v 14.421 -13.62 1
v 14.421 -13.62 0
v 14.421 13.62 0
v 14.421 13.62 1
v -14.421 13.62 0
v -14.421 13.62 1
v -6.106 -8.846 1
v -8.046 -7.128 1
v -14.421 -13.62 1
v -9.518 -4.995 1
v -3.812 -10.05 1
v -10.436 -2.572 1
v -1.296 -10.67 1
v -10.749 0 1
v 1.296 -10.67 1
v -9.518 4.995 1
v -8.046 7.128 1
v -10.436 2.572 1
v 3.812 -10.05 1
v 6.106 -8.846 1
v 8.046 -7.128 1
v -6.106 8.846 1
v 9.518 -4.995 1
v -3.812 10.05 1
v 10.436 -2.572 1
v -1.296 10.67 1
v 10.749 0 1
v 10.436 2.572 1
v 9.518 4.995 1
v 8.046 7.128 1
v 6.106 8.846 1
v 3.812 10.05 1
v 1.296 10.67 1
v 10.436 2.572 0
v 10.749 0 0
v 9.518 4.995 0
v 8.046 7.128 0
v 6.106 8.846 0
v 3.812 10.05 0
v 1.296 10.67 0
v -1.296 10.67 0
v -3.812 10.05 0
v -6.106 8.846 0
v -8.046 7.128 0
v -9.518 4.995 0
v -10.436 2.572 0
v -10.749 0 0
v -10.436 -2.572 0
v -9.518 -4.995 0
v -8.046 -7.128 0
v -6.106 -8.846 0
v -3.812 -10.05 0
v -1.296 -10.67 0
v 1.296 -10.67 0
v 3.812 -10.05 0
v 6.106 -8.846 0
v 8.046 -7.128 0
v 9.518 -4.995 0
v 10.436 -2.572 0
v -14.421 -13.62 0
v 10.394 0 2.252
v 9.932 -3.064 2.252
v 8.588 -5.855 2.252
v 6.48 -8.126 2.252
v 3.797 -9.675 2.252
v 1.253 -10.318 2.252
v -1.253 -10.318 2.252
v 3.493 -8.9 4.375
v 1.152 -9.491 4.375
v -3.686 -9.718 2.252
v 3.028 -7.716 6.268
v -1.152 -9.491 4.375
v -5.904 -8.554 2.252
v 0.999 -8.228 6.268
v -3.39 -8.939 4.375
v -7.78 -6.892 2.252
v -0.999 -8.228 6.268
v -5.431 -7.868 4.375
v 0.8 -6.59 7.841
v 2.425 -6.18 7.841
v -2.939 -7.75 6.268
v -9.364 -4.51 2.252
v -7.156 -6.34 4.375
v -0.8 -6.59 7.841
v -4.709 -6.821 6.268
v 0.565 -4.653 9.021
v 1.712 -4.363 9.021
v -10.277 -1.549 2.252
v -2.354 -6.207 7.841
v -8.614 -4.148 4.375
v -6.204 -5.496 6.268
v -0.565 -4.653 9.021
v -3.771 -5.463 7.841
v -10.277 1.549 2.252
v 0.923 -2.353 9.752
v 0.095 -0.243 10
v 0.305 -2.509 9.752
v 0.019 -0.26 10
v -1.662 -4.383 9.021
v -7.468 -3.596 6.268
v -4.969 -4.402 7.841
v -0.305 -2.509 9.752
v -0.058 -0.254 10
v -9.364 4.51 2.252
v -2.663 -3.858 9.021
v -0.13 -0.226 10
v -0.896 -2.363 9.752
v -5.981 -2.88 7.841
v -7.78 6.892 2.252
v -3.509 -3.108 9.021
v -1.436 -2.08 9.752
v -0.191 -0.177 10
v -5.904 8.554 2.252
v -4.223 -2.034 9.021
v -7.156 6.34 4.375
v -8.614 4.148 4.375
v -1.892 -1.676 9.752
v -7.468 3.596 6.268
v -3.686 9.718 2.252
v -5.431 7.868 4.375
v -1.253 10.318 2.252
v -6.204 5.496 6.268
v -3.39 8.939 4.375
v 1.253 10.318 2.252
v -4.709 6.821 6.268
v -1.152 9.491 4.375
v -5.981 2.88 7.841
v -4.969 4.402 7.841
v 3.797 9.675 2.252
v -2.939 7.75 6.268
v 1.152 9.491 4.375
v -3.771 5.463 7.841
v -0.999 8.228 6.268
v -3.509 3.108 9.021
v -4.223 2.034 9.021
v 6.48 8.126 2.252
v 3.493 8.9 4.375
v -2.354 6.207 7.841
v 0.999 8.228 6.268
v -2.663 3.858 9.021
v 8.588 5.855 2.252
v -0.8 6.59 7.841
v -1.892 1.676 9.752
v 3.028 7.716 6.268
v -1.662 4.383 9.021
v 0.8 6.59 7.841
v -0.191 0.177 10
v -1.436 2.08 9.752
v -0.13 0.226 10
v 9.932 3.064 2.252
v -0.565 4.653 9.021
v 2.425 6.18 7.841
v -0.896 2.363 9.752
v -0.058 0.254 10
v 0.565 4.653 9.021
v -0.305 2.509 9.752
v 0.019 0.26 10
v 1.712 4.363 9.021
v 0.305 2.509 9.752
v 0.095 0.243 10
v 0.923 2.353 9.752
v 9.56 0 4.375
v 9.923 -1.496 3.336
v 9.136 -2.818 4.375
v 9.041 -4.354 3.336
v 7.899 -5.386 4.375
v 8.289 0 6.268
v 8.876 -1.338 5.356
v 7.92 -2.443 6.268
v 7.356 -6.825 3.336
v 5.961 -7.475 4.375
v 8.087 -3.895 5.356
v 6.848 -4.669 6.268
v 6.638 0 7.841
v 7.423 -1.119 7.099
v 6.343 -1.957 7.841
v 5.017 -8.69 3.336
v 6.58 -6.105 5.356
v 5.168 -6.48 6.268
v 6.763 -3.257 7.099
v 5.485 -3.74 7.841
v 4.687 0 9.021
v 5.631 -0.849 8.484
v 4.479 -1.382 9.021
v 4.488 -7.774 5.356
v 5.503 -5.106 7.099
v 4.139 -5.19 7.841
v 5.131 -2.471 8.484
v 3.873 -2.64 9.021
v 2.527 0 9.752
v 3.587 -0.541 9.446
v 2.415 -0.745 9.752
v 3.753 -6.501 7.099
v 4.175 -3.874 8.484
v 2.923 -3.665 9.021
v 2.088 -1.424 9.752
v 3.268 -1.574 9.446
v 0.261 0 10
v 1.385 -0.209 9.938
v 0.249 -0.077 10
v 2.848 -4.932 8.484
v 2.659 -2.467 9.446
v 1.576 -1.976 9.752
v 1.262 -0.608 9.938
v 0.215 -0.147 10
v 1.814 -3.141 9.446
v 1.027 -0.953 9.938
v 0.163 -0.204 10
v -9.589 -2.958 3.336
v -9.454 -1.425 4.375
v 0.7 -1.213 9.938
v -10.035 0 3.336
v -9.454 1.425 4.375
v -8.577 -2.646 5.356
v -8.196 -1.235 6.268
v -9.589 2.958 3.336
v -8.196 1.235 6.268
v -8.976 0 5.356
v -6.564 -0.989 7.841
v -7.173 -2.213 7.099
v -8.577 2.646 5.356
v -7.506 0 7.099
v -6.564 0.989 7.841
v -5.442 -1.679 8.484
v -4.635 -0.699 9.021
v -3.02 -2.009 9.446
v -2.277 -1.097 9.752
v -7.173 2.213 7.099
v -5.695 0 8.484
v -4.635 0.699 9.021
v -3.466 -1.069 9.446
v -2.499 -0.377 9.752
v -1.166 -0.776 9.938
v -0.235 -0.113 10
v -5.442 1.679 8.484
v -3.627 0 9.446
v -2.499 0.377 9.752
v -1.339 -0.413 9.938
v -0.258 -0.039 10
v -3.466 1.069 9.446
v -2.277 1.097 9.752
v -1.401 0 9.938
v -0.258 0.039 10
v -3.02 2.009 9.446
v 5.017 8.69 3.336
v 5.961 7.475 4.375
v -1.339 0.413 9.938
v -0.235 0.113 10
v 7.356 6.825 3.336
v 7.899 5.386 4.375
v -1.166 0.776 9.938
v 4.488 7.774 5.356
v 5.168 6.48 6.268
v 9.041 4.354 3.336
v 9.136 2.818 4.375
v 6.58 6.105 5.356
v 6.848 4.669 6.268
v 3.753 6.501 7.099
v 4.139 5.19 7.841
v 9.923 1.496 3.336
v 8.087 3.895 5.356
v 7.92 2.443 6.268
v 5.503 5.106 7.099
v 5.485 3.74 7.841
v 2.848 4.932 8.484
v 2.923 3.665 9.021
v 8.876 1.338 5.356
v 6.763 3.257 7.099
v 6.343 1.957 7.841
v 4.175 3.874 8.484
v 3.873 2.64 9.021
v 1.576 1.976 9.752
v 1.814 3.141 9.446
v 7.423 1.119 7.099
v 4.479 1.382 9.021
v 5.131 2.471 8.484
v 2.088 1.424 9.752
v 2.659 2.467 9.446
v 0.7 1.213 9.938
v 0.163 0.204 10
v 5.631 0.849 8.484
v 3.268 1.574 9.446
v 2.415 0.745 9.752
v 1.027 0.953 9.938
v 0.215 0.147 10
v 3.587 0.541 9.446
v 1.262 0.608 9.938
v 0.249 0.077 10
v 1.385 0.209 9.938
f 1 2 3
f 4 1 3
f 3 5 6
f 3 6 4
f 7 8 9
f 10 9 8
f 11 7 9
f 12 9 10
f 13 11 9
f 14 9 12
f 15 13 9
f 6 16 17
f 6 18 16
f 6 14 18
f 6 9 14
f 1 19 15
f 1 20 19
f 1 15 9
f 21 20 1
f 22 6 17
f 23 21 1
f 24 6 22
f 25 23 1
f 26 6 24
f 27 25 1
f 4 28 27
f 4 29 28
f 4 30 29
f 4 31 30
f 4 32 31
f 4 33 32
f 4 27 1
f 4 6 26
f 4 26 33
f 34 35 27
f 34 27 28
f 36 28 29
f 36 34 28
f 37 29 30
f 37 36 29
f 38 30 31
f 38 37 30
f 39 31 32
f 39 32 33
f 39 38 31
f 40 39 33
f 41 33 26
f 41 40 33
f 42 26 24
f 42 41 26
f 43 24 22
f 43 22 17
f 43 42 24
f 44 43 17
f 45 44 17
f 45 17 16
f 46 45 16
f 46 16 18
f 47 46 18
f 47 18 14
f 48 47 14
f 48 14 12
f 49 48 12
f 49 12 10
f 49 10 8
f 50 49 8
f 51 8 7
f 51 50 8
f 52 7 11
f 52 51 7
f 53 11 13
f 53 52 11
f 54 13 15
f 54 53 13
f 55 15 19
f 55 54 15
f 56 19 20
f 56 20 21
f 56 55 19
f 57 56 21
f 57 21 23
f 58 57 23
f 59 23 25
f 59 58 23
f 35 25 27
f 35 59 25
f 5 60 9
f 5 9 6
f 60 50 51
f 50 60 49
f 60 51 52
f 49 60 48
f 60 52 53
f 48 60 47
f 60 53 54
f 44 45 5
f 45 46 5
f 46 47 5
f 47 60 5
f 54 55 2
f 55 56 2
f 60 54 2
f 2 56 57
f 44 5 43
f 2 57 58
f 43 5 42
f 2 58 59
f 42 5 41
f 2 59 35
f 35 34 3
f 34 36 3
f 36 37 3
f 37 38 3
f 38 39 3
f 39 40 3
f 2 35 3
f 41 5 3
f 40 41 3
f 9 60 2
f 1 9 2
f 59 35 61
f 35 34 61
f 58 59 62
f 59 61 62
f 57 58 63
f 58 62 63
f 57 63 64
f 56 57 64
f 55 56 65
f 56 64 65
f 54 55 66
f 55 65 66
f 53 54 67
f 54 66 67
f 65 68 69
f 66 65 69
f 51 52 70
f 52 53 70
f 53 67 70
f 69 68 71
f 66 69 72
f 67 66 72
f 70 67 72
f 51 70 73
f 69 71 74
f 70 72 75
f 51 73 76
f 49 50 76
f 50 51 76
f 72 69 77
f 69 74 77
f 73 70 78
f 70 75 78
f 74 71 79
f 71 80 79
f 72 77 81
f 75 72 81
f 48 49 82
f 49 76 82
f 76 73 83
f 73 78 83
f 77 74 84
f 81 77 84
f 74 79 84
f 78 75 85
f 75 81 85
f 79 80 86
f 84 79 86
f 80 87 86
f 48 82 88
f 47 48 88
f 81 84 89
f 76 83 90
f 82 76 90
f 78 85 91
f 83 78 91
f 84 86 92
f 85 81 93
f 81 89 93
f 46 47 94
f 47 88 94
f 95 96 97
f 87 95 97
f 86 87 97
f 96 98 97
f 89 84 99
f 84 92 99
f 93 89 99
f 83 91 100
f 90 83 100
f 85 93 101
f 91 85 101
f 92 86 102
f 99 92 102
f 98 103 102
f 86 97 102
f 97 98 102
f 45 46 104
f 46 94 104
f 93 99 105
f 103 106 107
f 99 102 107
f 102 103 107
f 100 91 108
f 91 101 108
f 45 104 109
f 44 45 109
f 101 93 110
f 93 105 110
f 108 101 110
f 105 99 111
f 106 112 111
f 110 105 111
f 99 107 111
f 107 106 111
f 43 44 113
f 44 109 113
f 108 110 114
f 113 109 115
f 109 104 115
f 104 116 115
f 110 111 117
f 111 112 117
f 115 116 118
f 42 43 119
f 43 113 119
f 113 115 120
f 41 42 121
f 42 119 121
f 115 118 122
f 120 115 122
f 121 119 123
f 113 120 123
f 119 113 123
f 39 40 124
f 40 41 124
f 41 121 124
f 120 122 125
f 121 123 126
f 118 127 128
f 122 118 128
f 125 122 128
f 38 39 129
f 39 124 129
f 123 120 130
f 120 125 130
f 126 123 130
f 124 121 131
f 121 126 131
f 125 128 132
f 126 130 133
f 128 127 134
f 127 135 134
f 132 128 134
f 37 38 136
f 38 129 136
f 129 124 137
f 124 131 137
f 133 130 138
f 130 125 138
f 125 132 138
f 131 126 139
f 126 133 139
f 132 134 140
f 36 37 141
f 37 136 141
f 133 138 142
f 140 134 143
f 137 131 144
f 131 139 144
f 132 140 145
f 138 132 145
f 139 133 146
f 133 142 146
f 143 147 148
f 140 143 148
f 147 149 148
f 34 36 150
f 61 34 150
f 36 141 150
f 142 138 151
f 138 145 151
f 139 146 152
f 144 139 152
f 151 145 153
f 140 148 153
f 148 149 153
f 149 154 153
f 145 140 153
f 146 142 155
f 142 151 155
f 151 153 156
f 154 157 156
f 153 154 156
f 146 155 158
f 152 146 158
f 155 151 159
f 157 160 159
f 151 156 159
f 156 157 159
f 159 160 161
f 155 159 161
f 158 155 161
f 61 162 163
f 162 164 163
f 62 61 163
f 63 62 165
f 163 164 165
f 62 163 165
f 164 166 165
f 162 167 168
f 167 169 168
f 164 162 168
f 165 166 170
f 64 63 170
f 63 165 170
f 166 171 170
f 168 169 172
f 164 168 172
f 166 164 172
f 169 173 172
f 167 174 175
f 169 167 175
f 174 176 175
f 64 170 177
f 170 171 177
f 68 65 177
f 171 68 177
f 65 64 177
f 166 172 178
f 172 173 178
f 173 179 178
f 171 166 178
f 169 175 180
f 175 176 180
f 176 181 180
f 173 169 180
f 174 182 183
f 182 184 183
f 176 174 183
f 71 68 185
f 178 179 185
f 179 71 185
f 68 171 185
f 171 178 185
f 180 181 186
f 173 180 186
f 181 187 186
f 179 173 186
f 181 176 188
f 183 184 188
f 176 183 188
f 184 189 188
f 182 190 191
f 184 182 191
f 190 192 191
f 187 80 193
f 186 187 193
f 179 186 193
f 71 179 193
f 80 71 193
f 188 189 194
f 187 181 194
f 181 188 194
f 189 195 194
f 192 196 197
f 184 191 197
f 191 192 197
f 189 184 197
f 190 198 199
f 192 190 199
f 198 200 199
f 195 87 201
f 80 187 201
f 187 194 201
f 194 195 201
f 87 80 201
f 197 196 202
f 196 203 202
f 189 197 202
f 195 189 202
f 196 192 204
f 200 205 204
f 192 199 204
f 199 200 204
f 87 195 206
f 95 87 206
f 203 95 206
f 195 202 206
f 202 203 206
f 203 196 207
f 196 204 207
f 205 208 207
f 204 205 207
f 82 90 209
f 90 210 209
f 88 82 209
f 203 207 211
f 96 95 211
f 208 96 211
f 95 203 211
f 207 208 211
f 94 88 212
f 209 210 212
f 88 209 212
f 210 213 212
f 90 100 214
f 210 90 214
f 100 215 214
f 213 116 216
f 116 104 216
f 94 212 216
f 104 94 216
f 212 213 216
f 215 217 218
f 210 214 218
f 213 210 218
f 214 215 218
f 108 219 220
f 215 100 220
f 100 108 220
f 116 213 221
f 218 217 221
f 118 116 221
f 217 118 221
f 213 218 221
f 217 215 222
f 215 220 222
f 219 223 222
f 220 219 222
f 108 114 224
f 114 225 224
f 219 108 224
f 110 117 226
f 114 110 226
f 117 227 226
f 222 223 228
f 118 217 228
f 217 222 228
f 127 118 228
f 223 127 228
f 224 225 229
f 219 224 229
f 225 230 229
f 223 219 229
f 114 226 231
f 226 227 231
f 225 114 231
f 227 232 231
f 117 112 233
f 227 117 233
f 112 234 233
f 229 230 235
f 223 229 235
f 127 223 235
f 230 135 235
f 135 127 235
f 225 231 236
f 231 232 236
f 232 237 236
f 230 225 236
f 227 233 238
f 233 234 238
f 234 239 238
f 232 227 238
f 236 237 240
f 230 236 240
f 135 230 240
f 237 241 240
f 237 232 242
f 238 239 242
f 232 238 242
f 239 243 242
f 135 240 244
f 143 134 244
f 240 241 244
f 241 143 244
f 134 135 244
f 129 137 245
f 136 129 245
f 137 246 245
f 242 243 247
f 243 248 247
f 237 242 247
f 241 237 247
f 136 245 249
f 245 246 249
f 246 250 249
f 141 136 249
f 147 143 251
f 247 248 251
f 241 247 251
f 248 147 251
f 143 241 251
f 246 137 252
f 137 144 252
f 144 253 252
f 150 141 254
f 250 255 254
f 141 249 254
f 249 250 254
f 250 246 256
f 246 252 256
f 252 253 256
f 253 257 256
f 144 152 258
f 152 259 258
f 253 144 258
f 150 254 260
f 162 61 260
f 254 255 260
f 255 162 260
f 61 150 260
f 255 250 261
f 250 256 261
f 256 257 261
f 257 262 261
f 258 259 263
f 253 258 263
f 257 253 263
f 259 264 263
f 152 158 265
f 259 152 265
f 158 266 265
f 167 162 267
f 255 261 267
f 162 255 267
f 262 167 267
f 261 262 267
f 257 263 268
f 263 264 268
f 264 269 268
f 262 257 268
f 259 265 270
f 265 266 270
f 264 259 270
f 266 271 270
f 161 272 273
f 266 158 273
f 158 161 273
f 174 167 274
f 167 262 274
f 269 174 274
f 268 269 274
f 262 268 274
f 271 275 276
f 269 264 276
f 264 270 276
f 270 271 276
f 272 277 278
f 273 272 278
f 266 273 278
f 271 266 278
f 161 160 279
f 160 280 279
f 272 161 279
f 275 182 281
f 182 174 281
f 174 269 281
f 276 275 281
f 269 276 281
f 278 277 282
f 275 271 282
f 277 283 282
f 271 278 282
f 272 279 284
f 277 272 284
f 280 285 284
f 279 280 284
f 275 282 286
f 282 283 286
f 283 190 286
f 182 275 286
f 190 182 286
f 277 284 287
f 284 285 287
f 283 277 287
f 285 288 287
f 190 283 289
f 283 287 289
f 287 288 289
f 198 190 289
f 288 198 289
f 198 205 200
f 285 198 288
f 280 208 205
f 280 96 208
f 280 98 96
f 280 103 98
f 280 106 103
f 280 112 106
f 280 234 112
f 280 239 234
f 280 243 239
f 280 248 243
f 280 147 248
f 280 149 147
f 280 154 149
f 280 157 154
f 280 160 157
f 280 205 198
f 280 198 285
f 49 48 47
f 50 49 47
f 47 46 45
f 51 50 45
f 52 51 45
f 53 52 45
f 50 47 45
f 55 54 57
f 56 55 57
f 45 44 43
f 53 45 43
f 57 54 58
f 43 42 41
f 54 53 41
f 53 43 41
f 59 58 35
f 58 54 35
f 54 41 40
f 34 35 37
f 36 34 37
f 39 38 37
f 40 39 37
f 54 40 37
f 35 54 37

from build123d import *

# Parameters (mm, degrees)
F0_R     = 10.7488151117
F1_DEPTH = 10
F1_TAPER = -3
F3_W     = 28.8420915604
F3_H     = 27.2397696972
F3_R     = 10.7488151117
F4_DEPTH = 1


# Not quite as in the source:
# - a fillet or chamfer that OpenCascade refuses, or shapes differently, is made with other operations: its cross-section is extruded or revolved along the edge and cut away or added


with BuildPart() as f1:
    # F0 (on Top) → F1 (new body)
    with BuildSketch(Plane.XY):
        Circle(F0_R)
    extrude(amount=F1_DEPTH, taper=F1_TAPER)

    # F2: fillet of radius 10.5 on 1 edges, made by hand

    # F2_s1 → F2_t2 (revolve, cut)
    with BuildSketch(Plane.XZ):
        with BuildLine():
            ThreePointArc((10.7488151117, 0), (7.5064150031, 7.0993420768), (0.26072663, 10))
            Line((0.26072663, 10), (11.2728929045, 10))
            Line((11.2728929045, 10), (10.7488151117, 0))
        make_face()
    revolve(axis=Axis((0, 0, 10), (0, 0, -1)), mode=Mode.SUBTRACT)


with BuildPart() as f4:
    # F3 (on face) → F4 (new body)
    with BuildSketch(Plane.XY):
        Rectangle(F3_W, F3_H)
        Circle(F3_R, mode=Mode.SUBTRACT)
    extrude(amount=F4_DEPTH)


solid = Compound([f1.part, f4.part])
